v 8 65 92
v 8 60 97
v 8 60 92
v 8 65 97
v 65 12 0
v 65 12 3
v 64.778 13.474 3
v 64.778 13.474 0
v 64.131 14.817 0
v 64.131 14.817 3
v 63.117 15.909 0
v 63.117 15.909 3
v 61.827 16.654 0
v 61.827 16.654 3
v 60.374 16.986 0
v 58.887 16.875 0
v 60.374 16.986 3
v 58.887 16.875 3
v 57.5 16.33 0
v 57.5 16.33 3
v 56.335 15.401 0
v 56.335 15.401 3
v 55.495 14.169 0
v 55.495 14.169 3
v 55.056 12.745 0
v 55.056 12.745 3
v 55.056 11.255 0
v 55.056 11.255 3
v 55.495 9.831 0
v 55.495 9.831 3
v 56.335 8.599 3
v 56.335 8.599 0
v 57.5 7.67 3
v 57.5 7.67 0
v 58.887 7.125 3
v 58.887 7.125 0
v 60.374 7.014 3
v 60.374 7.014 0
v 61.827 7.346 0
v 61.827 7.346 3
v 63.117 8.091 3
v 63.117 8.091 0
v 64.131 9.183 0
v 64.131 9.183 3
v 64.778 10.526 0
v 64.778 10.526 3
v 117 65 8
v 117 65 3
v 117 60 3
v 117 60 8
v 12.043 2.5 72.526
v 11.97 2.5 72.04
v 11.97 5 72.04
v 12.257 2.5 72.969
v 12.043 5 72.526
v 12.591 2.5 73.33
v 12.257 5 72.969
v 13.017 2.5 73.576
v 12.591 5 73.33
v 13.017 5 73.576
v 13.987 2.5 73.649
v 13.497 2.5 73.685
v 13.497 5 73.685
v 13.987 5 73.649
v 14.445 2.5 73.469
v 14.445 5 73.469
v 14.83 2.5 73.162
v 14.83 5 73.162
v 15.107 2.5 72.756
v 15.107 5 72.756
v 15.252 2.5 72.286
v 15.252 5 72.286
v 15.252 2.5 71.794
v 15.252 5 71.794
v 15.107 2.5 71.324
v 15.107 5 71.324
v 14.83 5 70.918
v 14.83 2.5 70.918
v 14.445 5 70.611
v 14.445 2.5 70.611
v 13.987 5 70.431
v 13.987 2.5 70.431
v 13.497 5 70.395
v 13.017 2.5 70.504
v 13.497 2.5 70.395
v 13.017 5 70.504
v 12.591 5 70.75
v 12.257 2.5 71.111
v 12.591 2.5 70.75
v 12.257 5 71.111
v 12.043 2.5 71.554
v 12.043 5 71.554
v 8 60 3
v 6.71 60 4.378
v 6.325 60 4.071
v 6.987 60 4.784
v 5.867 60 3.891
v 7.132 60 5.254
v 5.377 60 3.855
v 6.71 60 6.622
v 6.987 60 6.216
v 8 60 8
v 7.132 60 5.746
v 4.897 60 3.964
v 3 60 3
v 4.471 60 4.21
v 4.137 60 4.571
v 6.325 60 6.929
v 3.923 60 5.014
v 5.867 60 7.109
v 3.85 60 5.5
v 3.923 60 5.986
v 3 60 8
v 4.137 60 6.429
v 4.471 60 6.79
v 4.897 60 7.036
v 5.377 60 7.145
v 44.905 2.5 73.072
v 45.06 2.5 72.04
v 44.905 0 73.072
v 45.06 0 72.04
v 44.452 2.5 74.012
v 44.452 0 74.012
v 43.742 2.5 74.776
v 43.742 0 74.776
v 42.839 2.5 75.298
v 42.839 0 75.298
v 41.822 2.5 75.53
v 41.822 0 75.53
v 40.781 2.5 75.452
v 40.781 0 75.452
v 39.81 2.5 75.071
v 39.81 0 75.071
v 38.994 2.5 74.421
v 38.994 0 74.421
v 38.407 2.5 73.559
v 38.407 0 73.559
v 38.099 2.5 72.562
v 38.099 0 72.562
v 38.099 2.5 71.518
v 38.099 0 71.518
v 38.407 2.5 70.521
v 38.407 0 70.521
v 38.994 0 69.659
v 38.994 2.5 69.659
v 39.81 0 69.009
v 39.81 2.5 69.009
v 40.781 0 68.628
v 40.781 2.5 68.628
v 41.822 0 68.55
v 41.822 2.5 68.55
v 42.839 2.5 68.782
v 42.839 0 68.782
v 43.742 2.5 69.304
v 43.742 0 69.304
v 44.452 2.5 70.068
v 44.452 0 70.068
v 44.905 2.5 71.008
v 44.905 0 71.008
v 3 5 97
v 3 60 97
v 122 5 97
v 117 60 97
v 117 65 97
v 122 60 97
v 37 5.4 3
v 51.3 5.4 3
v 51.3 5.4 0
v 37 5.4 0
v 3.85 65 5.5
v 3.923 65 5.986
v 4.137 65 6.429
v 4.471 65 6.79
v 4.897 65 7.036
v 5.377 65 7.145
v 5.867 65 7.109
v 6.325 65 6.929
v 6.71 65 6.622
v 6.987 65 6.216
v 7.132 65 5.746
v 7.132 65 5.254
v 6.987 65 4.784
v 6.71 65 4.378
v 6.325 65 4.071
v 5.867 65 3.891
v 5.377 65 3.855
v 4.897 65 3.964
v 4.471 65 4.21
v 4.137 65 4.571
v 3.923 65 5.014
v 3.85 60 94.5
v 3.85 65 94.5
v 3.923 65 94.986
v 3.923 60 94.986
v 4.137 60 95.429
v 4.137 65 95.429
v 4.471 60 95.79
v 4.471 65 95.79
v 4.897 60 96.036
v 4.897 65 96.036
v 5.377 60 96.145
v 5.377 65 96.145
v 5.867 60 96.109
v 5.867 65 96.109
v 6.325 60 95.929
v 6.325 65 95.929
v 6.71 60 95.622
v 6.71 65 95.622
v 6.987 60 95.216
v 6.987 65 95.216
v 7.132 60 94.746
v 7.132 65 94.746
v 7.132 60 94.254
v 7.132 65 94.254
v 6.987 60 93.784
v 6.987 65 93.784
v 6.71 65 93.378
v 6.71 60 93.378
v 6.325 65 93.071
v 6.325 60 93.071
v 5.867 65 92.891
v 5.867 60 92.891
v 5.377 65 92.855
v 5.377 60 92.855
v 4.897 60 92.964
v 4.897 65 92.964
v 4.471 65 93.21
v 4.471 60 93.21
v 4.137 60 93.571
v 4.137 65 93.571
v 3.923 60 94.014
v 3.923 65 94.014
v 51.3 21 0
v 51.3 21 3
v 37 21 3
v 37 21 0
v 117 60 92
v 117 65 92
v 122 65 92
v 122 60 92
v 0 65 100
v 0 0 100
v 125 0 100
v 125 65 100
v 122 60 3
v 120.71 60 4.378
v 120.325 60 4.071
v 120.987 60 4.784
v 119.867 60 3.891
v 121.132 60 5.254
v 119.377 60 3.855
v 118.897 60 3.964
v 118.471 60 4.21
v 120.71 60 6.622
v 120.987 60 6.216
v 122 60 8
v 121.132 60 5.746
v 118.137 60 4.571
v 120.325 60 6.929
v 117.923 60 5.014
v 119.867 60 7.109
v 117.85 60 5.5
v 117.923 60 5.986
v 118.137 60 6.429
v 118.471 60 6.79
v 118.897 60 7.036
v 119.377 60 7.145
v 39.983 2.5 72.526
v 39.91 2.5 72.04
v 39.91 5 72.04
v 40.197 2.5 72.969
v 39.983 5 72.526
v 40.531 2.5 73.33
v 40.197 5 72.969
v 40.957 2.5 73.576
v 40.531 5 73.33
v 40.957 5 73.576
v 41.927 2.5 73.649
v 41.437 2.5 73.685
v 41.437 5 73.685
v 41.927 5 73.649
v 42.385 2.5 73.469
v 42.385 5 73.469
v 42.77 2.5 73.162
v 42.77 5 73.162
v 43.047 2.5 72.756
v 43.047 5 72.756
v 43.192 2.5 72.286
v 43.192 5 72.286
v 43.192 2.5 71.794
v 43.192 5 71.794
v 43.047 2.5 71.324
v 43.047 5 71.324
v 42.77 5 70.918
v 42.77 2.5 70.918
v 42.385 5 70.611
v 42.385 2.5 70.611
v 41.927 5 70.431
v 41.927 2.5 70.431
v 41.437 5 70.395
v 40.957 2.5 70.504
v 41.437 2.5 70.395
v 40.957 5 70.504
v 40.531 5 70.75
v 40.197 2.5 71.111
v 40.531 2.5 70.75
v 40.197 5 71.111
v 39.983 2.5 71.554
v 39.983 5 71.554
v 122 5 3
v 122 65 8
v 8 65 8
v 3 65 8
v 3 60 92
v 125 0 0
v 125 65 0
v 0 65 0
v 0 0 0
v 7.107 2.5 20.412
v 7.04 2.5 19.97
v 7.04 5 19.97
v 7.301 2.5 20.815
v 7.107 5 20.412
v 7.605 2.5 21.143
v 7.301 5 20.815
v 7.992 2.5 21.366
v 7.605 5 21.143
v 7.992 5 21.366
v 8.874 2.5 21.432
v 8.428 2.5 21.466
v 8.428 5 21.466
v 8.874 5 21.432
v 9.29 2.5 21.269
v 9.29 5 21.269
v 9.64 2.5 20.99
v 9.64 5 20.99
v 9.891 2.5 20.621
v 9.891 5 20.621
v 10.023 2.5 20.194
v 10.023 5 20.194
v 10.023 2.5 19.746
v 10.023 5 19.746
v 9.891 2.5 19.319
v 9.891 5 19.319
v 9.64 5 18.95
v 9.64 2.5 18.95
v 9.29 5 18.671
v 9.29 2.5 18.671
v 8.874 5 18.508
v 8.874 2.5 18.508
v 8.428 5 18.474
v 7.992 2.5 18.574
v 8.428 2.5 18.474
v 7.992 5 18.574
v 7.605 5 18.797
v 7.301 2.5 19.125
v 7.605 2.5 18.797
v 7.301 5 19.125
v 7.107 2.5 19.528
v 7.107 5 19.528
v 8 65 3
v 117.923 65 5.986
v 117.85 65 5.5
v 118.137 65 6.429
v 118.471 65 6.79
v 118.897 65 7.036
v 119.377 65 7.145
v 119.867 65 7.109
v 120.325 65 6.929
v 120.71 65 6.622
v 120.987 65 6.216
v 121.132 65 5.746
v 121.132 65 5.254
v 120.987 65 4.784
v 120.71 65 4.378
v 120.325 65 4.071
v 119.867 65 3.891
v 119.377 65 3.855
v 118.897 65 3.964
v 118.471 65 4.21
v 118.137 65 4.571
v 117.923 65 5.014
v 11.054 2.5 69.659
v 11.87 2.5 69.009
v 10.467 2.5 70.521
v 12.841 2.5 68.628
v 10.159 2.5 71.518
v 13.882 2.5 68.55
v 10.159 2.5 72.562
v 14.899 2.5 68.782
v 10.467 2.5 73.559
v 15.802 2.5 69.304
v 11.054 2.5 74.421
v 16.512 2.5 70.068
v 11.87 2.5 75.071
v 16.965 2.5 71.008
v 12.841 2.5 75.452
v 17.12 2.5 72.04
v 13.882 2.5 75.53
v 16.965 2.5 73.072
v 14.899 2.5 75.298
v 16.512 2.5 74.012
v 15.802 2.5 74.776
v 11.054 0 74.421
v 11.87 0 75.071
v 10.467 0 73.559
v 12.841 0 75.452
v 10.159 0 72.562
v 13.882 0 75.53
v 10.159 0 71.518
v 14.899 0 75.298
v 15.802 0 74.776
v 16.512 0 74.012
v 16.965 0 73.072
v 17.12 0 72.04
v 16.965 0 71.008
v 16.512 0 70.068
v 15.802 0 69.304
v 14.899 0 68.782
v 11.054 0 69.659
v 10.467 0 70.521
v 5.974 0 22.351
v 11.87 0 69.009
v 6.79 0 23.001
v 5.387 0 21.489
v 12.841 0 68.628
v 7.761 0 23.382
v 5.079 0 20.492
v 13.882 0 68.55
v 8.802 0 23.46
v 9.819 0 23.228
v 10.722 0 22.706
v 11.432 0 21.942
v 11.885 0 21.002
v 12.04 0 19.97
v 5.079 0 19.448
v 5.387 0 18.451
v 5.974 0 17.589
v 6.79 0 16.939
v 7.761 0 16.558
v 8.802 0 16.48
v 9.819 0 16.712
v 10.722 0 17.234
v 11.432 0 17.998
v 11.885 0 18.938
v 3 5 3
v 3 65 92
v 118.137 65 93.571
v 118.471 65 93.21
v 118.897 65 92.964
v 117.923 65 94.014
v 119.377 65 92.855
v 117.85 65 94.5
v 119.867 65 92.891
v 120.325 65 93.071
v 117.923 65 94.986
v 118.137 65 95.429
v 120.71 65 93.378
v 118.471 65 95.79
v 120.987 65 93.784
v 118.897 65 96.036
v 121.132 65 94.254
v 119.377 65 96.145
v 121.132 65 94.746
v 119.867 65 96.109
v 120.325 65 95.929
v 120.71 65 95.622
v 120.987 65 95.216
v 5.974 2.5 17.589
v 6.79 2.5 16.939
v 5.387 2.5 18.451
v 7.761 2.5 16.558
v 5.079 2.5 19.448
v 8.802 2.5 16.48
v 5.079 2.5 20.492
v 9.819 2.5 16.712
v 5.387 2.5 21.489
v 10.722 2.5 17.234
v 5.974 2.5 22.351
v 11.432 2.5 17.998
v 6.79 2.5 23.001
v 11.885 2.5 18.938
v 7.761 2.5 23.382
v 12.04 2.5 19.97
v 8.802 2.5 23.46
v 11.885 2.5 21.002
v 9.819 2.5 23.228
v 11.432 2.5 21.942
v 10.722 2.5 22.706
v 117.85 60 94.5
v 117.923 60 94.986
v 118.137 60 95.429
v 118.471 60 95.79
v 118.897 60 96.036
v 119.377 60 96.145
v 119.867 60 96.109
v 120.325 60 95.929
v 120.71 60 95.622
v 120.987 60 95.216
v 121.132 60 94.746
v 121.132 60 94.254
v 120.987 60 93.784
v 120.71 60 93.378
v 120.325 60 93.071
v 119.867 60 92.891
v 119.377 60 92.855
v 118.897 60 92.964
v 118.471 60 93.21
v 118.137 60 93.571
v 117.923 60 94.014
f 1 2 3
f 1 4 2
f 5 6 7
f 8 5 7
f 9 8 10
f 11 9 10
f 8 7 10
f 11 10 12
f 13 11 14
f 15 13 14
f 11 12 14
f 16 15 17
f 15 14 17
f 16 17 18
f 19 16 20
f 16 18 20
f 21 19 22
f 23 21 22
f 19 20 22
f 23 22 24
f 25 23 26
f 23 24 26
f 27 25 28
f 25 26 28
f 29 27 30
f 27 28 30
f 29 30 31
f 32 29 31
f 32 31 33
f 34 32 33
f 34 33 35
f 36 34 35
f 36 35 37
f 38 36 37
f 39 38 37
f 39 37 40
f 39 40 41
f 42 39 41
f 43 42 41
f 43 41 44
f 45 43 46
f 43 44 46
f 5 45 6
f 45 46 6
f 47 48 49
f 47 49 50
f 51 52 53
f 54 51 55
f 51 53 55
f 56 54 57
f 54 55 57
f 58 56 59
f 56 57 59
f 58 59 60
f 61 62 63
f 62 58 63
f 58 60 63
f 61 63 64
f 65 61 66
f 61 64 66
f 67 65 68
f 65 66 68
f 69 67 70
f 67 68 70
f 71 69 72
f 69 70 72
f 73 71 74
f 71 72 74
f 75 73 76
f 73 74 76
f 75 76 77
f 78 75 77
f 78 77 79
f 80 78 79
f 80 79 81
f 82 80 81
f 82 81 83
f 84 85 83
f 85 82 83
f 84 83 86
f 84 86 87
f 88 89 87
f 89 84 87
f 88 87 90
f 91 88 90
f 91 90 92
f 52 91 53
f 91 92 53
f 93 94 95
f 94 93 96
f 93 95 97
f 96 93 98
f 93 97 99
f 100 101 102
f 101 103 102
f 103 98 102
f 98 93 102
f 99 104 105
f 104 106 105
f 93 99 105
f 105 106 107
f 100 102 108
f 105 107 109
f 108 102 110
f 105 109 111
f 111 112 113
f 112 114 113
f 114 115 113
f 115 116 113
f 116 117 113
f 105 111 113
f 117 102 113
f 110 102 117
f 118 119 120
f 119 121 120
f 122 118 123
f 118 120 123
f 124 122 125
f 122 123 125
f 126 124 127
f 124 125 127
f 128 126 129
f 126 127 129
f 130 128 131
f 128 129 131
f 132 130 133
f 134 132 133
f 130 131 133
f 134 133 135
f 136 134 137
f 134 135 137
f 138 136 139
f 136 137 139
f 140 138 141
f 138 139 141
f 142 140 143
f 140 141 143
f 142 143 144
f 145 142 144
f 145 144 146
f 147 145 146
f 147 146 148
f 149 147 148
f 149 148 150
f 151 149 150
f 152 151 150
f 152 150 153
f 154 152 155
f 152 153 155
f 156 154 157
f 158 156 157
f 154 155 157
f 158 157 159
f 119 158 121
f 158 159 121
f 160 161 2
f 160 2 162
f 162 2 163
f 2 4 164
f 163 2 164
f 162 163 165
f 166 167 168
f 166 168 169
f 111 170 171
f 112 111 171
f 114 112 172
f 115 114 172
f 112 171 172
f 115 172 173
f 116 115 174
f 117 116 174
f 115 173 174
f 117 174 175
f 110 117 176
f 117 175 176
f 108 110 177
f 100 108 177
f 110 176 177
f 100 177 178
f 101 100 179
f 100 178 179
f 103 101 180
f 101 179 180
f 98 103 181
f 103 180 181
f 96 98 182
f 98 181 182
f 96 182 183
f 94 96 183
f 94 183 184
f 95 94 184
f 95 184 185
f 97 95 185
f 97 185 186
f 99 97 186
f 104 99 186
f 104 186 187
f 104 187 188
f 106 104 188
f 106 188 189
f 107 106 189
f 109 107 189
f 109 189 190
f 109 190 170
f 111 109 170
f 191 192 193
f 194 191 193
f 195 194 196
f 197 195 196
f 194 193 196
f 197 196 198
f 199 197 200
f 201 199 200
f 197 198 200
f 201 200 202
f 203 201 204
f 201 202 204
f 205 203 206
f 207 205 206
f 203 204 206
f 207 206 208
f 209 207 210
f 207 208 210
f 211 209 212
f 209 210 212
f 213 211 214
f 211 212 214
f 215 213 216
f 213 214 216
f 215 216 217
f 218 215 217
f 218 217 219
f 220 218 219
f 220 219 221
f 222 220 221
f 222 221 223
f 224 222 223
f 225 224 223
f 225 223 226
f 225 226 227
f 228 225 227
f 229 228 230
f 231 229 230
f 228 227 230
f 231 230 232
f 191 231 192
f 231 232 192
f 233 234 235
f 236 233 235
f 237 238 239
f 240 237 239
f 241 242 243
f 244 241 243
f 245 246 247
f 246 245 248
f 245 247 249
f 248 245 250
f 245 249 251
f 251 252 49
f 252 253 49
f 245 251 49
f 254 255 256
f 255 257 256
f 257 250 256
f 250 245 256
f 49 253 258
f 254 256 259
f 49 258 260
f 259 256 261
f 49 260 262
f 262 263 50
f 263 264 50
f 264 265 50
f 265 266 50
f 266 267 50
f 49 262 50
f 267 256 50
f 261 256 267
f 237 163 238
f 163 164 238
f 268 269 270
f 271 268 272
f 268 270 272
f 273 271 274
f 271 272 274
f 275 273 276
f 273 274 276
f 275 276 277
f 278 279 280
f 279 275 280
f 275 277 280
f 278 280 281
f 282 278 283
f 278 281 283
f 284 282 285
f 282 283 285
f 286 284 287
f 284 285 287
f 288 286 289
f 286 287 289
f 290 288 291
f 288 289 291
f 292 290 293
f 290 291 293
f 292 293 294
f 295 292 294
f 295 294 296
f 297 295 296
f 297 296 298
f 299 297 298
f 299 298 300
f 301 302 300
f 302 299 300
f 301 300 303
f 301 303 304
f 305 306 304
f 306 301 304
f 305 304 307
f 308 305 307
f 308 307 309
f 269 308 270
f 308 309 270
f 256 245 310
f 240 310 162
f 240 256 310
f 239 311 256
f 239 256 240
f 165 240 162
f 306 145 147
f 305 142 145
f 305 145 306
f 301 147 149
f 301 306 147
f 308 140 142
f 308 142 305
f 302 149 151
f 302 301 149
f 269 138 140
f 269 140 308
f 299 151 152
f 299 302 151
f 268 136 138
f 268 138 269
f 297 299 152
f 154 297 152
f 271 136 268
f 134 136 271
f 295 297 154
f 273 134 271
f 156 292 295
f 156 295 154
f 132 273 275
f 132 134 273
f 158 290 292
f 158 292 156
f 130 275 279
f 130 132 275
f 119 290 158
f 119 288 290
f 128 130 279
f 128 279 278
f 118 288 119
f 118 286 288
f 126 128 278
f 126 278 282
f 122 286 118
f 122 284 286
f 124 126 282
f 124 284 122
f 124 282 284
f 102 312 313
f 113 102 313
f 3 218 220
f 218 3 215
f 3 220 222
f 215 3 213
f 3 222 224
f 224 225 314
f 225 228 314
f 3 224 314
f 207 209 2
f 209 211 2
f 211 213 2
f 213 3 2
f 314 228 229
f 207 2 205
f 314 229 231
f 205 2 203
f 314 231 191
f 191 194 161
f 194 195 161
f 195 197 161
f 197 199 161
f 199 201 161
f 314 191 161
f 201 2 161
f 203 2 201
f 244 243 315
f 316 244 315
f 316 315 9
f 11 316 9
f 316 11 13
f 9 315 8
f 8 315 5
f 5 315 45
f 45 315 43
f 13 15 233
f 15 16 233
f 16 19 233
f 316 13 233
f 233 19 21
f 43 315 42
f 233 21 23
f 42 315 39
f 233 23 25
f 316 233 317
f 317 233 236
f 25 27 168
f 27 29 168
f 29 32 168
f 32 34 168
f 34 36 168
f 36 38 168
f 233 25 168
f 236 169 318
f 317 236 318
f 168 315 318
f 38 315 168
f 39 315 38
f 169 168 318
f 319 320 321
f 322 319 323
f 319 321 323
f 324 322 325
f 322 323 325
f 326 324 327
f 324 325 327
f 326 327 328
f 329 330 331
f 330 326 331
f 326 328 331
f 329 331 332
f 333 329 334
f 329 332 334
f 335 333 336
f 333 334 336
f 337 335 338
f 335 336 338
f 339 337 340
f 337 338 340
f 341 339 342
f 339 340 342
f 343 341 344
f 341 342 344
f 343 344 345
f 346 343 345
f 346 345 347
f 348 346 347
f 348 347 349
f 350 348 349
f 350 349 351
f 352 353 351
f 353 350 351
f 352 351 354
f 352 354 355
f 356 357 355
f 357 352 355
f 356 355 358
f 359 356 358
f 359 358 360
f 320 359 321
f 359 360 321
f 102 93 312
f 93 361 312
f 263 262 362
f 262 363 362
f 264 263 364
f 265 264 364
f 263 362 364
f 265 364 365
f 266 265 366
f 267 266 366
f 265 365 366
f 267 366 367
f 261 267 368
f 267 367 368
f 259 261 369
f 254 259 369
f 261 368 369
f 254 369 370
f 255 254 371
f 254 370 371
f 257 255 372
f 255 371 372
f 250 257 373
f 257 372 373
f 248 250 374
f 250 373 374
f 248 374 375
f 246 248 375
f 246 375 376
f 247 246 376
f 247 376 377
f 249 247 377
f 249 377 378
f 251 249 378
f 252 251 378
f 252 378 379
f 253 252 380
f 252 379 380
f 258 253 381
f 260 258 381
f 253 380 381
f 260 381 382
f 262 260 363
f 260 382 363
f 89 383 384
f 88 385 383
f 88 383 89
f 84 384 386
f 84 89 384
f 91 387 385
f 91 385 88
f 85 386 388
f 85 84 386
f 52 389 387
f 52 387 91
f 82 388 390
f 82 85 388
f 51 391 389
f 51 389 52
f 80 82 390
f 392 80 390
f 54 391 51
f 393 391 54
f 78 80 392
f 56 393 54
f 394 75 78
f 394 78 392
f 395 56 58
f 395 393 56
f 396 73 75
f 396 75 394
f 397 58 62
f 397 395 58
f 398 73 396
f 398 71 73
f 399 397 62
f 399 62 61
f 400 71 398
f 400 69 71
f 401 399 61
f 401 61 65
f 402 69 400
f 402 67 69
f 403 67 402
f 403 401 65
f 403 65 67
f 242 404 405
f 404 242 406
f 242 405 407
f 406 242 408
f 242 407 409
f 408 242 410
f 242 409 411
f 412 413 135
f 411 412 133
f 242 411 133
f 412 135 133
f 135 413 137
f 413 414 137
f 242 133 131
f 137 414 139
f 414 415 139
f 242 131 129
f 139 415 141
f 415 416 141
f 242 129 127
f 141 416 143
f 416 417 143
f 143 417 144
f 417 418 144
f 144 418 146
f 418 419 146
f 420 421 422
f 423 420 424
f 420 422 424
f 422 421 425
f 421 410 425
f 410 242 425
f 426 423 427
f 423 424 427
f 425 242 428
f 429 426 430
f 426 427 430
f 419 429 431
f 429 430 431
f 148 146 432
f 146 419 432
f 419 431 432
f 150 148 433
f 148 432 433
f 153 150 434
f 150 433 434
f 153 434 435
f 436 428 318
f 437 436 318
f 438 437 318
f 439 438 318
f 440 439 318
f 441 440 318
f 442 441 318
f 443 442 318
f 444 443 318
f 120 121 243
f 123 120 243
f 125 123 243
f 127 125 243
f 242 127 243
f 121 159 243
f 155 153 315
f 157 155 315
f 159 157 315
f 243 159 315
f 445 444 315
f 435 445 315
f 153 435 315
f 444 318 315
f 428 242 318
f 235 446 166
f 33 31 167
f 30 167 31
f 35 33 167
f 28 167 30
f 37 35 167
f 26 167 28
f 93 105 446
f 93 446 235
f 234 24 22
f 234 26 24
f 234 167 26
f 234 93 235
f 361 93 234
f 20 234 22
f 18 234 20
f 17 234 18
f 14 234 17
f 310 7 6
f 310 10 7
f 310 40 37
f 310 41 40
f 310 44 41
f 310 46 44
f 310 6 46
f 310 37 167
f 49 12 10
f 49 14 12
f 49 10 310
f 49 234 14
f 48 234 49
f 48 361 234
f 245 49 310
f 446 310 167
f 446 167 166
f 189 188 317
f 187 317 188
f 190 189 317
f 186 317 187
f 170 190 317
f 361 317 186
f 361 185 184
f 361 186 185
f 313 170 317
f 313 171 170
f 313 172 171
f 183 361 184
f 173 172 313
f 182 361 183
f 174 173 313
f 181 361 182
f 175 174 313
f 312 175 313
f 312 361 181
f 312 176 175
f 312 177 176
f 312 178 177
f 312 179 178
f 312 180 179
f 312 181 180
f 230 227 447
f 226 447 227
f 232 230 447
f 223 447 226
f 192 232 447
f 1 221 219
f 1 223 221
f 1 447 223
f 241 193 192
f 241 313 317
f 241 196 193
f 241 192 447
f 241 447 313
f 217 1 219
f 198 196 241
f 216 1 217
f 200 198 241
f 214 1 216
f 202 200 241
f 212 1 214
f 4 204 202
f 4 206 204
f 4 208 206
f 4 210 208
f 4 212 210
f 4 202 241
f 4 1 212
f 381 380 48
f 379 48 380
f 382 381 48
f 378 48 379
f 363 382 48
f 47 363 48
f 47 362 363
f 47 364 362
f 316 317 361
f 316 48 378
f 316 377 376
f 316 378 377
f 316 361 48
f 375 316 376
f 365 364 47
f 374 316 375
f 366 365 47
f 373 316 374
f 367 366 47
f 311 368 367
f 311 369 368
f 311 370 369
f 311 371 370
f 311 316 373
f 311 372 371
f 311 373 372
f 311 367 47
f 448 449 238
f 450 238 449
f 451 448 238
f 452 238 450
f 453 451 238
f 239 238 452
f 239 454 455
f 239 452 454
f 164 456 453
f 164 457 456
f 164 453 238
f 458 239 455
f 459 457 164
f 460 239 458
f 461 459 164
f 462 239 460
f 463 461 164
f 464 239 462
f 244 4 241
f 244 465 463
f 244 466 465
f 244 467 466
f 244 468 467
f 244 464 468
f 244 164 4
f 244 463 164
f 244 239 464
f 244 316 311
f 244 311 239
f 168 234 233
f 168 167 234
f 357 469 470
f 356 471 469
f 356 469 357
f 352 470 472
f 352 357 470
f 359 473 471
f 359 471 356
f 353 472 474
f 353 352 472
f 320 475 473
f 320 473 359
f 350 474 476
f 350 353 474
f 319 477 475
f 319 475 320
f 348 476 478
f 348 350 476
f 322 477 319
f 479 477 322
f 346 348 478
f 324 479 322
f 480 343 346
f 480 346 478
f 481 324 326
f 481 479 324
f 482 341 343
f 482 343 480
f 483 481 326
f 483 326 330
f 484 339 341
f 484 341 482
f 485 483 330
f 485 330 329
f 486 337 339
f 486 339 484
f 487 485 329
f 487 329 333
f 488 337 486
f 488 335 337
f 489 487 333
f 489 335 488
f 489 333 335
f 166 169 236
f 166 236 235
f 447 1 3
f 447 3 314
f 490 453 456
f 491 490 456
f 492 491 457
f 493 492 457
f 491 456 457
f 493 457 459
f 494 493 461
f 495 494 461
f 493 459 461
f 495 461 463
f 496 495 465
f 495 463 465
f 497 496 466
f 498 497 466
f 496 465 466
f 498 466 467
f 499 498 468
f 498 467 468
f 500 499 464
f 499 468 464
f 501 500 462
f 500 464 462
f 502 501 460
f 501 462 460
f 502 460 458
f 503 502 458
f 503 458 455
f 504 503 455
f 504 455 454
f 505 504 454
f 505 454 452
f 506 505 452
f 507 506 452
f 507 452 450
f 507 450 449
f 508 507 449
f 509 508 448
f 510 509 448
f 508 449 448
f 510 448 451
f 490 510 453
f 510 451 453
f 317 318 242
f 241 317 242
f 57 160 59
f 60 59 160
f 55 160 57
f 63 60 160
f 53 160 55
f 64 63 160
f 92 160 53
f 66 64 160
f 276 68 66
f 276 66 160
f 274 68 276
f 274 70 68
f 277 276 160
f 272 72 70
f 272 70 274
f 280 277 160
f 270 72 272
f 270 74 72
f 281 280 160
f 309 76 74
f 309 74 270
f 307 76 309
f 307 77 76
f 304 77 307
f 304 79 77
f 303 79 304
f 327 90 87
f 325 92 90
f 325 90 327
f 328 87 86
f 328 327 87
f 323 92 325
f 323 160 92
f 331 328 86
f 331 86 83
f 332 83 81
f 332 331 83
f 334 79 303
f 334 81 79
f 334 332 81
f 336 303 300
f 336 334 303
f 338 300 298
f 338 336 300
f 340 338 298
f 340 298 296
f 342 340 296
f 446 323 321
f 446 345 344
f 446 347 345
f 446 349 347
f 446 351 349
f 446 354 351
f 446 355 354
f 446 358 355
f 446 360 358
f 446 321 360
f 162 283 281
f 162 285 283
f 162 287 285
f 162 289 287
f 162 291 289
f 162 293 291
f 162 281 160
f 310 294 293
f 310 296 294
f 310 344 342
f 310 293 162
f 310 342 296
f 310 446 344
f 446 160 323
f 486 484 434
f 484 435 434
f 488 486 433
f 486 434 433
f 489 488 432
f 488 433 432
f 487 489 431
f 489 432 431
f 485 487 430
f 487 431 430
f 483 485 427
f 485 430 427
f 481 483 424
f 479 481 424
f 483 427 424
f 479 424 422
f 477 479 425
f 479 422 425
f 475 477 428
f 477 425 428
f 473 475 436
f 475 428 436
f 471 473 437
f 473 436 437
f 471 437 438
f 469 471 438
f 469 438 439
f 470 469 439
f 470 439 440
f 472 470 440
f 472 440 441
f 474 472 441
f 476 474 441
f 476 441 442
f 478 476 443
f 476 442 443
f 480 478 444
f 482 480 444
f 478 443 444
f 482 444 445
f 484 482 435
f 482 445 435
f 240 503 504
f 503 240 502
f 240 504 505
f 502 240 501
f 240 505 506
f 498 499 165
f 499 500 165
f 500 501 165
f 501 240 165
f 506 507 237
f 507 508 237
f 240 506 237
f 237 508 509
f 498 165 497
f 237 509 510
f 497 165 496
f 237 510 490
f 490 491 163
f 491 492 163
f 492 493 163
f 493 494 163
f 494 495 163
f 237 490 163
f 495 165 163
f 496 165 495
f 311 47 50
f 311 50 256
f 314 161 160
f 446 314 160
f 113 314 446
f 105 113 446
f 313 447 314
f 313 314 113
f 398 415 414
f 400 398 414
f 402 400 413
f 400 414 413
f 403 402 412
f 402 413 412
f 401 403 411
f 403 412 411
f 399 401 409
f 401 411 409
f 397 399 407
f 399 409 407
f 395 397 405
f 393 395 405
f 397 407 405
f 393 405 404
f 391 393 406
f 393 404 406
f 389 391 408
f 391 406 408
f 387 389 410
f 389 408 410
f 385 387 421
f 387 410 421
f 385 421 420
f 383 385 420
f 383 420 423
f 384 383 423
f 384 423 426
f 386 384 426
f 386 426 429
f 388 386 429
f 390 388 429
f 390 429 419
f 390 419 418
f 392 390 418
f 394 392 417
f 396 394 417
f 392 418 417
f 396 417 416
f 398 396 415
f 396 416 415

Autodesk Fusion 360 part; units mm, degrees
sketch "Sketch1" plane through (0, 0, 0) normal (0, 1, 0) x (1, 0, 0)
  line L0 (0, 0) -> (125, 0)
  line L1 (125, 0) -> (125, -100)
  line L2 (125, -100) -> (0, -100)
  line L3 (0, -100) -> (0, 0)
  dimension "d1" = 125
  dimension "d2" = 100
extrude "Extrude1" add sketch "Sketch1" along normal blind 5
sketch "Sketch2" plane through (0, 5, 0) normal (0, 1, 0) x (-1, 0, 0)
  line L0 (0, 100) -> (-125, 100)
  line L1 (-125, 100) -> (-125, 0)
  line L2 (-125, 0) -> (0, 0)
  line L3 (0, 0) -> (0, 100)
  line L4 (-122, 3) -> (-3, 3)
  line L5 (-3, 3) -> (-3, 97)
  line L6 (-3, 97) -> (-122, 97)
  line L7 (-122, 97) -> (-122, 3)
  line L8 (-6, 6) -> (-59.3, 6)
  line L9 (-59.3, 6) -> (-59.3, 74.6)
  line L10 (-59.3, 74.6) -> (-6, 74.6)
  line L11 (-6, 74.6) -> (-6, 6)
  line L12 (-59.3, 6) -> (-52.3, 6)
  line L13 (-6, 6) -> (-37, 6)
  line L14 (-37, 3) -> (-52, 3)
  line L15 (-52, 3) -> (-52, 0)
  line L16 (-52, 0) -> (-37, 0)
  line L17 (-37, 0) -> (-37, 3)
  line L18 (-6, 6) -> (-6, 19.97)
  circle A0 centre (-8.54, 19.97) radius 1.5
  line L19 (-6, 6) -> (-6, 72.04)
  circle A1 centre (-13.62, 72.04) radius 1.65
  circle A2 centre (-41.56, 72.04) radius 1.65
  line L20 (-119, 6) -> (-64, 6)
  line L21 (-64, 6) -> (-64, 90)
  line L22 (-64, 90) -> (-119, 90)
  line L23 (-119, 90) -> (-119, 6)
  dimension "d9" = 53.3
  dimension "d10" = 68.6
  dimension "d11" = 7
  dimension "d12" = 31
  dimension "d13" = 13.97
  dimension "d14" = 2.54
  dimension "d15" = 3
  dimension "d16" = 66.04
  dimension "d17" = 7.62
  dimension "d18" = 35.56
  dimension "d19" = 3.3
  dimension "d20" = 3.3
  dimension "d21" = 55
  dimension "d22" = 84
extrude "Extrude2" cut sketch "Sketch2" against normal blind 5 contours A0 | A1 | A2
sketch "Sketch3" plane through (0, 5, 0) normal (0, 1, 0) x (-1, 0, 0)
  circle A0 centre (-8.54, 19.97) radius 1.5
  circle A1 centre (-13.62, 72.04) radius 1.65
  circle A2 centre (-41.56, 72.04) radius 1.65
  line L0 (0, 100) -> (-125, 100)
  line L1 (-125, 100) -> (-125, 0)
  line L2 (-125, 0) -> (0, 0)
  line L3 (0, 0) -> (0, 100)
  line L4 (-3, 3) -> (-123.5, 3)
  line L5 (-123.5, 3) -> (-123.5, 98.5)
  line L6 (-123.5, 98.5) -> (-3, 98.5)
  line L7 (-3, 98.5) -> (-3, 3)
  line L8 (-6, 6) -> (-59.3, 6)
  line L9 (-59.3, 6) -> (-59.3, 74.6)
  line L10 (-59.3, 74.6) -> (-6, 74.6)
  line L11 (-6, 74.6) -> (-6, 6)
  line L12 (-6, 6) -> (-37, 6)
  line L13 (-59.3, 6) -> (-51.3, 6)
  line L14 (-37, 3) -> (-51.3, 3)
  line L15 (-51.3, 3) -> (-51.3, 0)
  line L16 (-51.3, 0) -> (-37, 0)
  line L17 (-37, 0) -> (-37, 3)
  dimension "d25" = 53.3
  dimension "d26" = 68.6
  dimension "d27" = 31
  dimension "d28" = 8
extrude "Extrude3" add sketch "Sketch3" along normal blind 1 contours L0 L1 L2 L3 L4 L5 L6 L7 L15 L17
sketch "Sketch4" plane through (0, 0, 0) normal (0, -1, 0) x (1, 0, 0)
  circle A0 centre (8.54, 19.97) radius 1.5
  circle A1 centre (13.62, 72.04) radius 1.65
  circle A2 centre (41.56, 72.04) radius 1.65
  line L0 (125, 100) -> (0, 100)
  line L1 (0, 100) -> (0, 0)
  line L2 (0, 0) -> (125, 0)
  line L3 (125, 0) -> (125, 100)
  circle A3 centre (8.54, 19.97) radius 3.5
  circle A4 centre (13.62, 72.04) radius 3.5
  circle A5 centre (41.56, 72.04) radius 3.5
  dimension "d31" = 7
  dimension "d32" = 7
  dimension "d33" = 7
extrude "Extrude4" cut sketch "Sketch4" against normal blind 2.5 contours A3 | A4 | A5
extrude "Extrude5" add 1 faces at (1, 6, 34.3333) along direction (0, 1, 0) blind 17
sketch "Sketch5" plane through (0, 5, 0) normal (0, 1, 0) x (-1, 0, 0)
  line L0 (-51.3, 3) -> (-51.3, 0)
  line L1 (-51.3, 0) -> (-37, 0)
  line L2 (-37, 0) -> (-37, 3)
  line L3 (-37, 3) -> (-3, 3)
  line L4 (-3, 3) -> (-3, 98.5)
  line L5 (-3, 98.5) -> (-123.5, 98.5)
  line L6 (-123.5, 98.5) -> (-123.5, 3)
  line L7 (-123.5, 3) -> (-51.3, 3)
  circle A0 centre (-8.54, 19.97) radius 1.5
  circle A1 centre (-13.62, 72.04) radius 1.65
  circle A2 centre (-41.56, 72.04) radius 1.65
  line L8 (-51.3, 3) -> (-37, 3)
  line L9 (-37, 3) -> (-37, 0)
  line L10 (-37, 0) -> (-51.3, 0)
  line L11 (-51.3, 0) -> (-51.3, 3)
extrude "Extrude6" add sketch "Sketch5" along normal blind 0.4 contours L0 L1 L2 L8 L9 L10 L11
extrude "Extrude7" cut 1 faces at (1, 23, 34.3333) along direction (0, -1, 0) blind 2
sketch "Sketch6" plane through (0, 21, 0) normal (0, 1, 0) x (-1, 0, 0)
  line L0 (0, 0) -> (0, 100)
  line L1 (0, 100) -> (-125, 100)
  line L2 (-125, 100) -> (-125, 0)
  line L3 (-125, 0) -> (-51.3, 0)
  line L4 (-51.3, 0) -> (-51.3, 3)
  line L5 (-51.3, 3) -> (-123.5, 3)
  line L6 (-123.5, 3) -> (-123.5, 98.5)
  line L7 (-123.5, 98.5) -> (-3, 98.5)
  line L8 (-3, 98.5) -> (-3, 3)
  line L9 (-3, 3) -> (-37, 3)
  line L10 (-37, 3) -> (-37, 0)
  line L11 (-37, 0) -> (0, 0)
  line L12 (-37, 0) -> (-51.3, 0)
  line L13 (-51.3, 0) -> (-51.3, 3)
  line L14 (-51.3, 3) -> (-37, 3)
  line L15 (-37, 3) -> (-37, 0)
extrude "Extrude8" add sketch "Sketch6" along normal blind 44 contours L0 L1 L2 L3 L4 L5 L6 L7 L8 L9 L10 L11 L13 L15 | L4 L10 L12 L13 L14 L15
sketch "Sketch7" plane through (0, 0, 3) normal (0, 0, 1) x (1, 0, 0)
  line L0 (3, 65) -> (3, 5)
  line L1 (3, 5) -> (123.5, 5)
  line L2 (123.5, 5) -> (123.5, 65)
  line L3 (123.5, 65) -> (3, 65)
  line L4 (37, 21) -> (51.3, 21)
  line L5 (51.3, 21) -> (51.3, 5.4)
  line L6 (51.3, 5.4) -> (37, 5.4)
  line L7 (37, 5.4) -> (37, 21)
  circle A0 centre (60, 12) radius 5
  dimension "d44" = 10
extrude "Extrude9" cut sketch "Sketch7" against normal blind 3 contours A0
extrude "Extrude10" add 1 faces at (83.3333, 25, 98.5) along direction (0, 0, -1) blind 1.5
extrude "Extrude11" add 1 faces at (123.5, 25, 34.3333) along direction (-1, 0, 0) blind 1.5
sketch "Sketch8" plane through (0, 5, 0) normal (0, 1, 0) x (-1, 0, 0)
  line L0 (-122, 97) -> (-122, 3)
  line L1 (-122, 3) -> (-3, 3)
  line L2 (-3, 3) -> (-3, 97)
  line L3 (-3, 97) -> (-122, 97)
  circle A0 centre (-41.56, 72.04) radius 1.65
  circle A1 centre (-13.62, 72.04) radius 1.65
  circle A2 centre (-8.54, 19.97) radius 1.5
sketch "Sketch9" plane through (0, 65, 0) normal (0, 1, 0) x (-1, 0, 0)
  line L0 (-3, 3) -> (-122, 3)
  line L1 (-122, 3) -> (-122, 97)
  line L2 (-122, 97) -> (-3, 97)
  line L3 (-3, 97) -> (-3, 3)
  line L4 (0, 0) -> (0, 100)
  line L5 (0, 100) -> (-125, 100)
  line L6 (-125, 100) -> (-125, 0)
  line L7 (-125, 0) -> (0, 0)
  line L8 (-122, 97) -> (-112, 97)
  line L9 (-112, 97) -> (-112, 87)
  line L10 (-112, 87) -> (-122, 87)
  line L11 (-122, 87) -> (-122, 97)
  line L12 (-122, 3) -> (-112, 3)
  line L13 (-112, 3) -> (-112, 13)
  line L14 (-112, 13) -> (-122, 13)
  line L15 (-122, 13) -> (-122, 3)
  line L16 (-3, 97) -> (-13, 97)
  line L17 (-13, 97) -> (-13, 87)
  line L18 (-13, 87) -> (-3, 87)
  line L19 (-3, 87) -> (-3, 97)
  line L20 (-3, 3) -> (-13, 3)
  line L21 (-13, 3) -> (-13, 13)
  line L22 (-13, 13) -> (-3, 13)
  line L23 (-3, 13) -> (-3, 3)
  dimension "d51" = 10
  dimension "d52" = 10
  dimension "d53" = 10
  dimension "d54" = 10
  dimension "d55" = 10
  dimension "d56" = 10
extrude "Extrude12" add sketch "Sketch9" against normal blind 3 contours L0 L3 L20 L21 L22 L23 | L0 L1 L12 L13 L14 L15 | L2 L3 L16 L17 L18 L19 | L1 L2 L8 L9 L10 L11
sketch "Sketch10" plane through (0, 65, 0) normal (0, 1, 0) x (-1, 0, 0)
  line L0 (-13, 3) -> (-112, 3)
  line L1 (-112, 3) -> (-112, 13)
  line L2 (-112, 13) -> (-122, 13)
  line L3 (-122, 13) -> (-122, 87)
  line L4 (-122, 87) -> (-112, 87)
  line L5 (-112, 87) -> (-112, 97)
  line L6 (-112, 97) -> (-13, 97)
  line L7 (-13, 97) -> (-13, 87)
  line L8 (-13, 87) -> (-3, 87)
  line L9 (-3, 87) -> (-3, 13)
  line L10 (-3, 13) -> (-13, 13)
  line L11 (-13, 13) -> (-13, 3)
  line L12 (0, 0) -> (0, 100)
  line L13 (0, 100) -> (-125, 100)
  line L14 (-125, 100) -> (-125, 0)
  line L15 (-125, 0) -> (0, 0)
  circle A0 centre (-8, 8) radius 1.65
  circle A1 centre (-8, 92) radius 1.65
  circle A2 centre (-117, 92) radius 1.65
  circle A3 centre (-117, 8) radius 1.65
  dimension "d59" = 3.3
  dimension "d60" = 3.3
  dimension "d61" = 3.3
  dimension "d62" = 3.3
extrude "Extrude13" cut sketch "Sketch10" against normal blind 3 contours A0 | A1 | A2 | A3
delete_face "DeleteFace1" 1 faces at (115.3521, 63, 91.9178)
delete_face "DeleteFace2" 1 faces at (117.7527, 63, 6.5317)
delete_face "DeleteFace3" 2 faces at (6.3582, 64, 7.8357) (6.3521, 63, 91.9178)
sketch "Sketch11" plane through (0, 65, 0) normal (0, 1, 0) x (-1, 0, 0)
  line L0 (-13, 3) -> (-112, 3)
  line L1 (-112, 3) -> (-112, 13)
  line L2 (-112, 13) -> (-122, 13)
  line L3 (-122, 13) -> (-122, 87)
  line L4 (-122, 87) -> (-112, 87)
  line L5 (-112, 87) -> (-112, 97)
  line L6 (-112, 97) -> (-13, 97)
  line L7 (-13, 97) -> (-13, 87)
  line L8 (-13, 87) -> (-3, 87)
  line L9 (-3, 87) -> (-3, 13)
  line L10 (-3, 13) -> (-13, 13)
  line L11 (-13, 13) -> (-13, 3)
  line L12 (0, 0) -> (0, 100)
  line L13 (0, 100) -> (-125, 100)
  line L14 (-125, 100) -> (-125, 0)
  line L15 (-125, 0) -> (0, 0)
  line L16 (-13, 13) -> (-3, 13)
  line L17 (-3, 13) -> (-3, 3)
  line L18 (-3, 3) -> (-13, 3)
  line L19 (-13, 3) -> (-13, 13)
  line L20 (-13, 87) -> (-3, 87)
  line L21 (-3, 87) -> (-3, 97)
  line L22 (-3, 97) -> (-13, 97)
  line L23 (-13, 97) -> (-13, 87)
  line L24 (-112, 87) -> (-122, 87)
  line L25 (-122, 87) -> (-122, 97)
  line L26 (-122, 97) -> (-112, 97)
  line L27 (-112, 97) -> (-112, 87)
  line L28 (-112, 13) -> (-122, 13)
  line L29 (-122, 13) -> (-122, 3)
  line L30 (-122, 3) -> (-112, 3)
  line L31 (-112, 3) -> (-112, 13)
extrude "Extrude14" cut sketch "Sketch11" against normal blind 3 contours L10 L11 L16 L17 L18 L19 | L1 L2 L28 L29 L30 L31 | L7 L8 L20 L21 L22 L23 | L4 L5 L24 L25 L26 L27
sketch "Sketch12" plane through (0, 65, 0) normal (0, 1, 0) x (-1, 0, 0)
  line L0 (-3, 97) -> (-3, 3)
  line L1 (-3, 3) -> (-122, 3)
  line L2 (-122, 3) -> (-122, 97)
  line L3 (-122, 97) -> (-3, 97)
  line L4 (0, 0) -> (0, 100)
  line L5 (0, 100) -> (-125, 100)
  line L6 (-125, 100) -> (-125, 0)
  line L7 (-125, 0) -> (0, 0)
  line L8 (-3, 3) -> (-8, 3)
  line L9 (-8, 3) -> (-8, 8)
  line L10 (-8, 8) -> (-3, 8)
  line L11 (-3, 8) -> (-3, 3)
  line L12 (-3, 97) -> (-8, 97)
  line L13 (-8, 97) -> (-8, 92)
  line L14 (-8, 92) -> (-3, 92)
  line L15 (-3, 92) -> (-3, 97)
  line L16 (-122, 97) -> (-117, 97)
  line L17 (-117, 97) -> (-117, 92)
  line L18 (-117, 92) -> (-122, 92)
  line L19 (-122, 92) -> (-122, 97)
  line L20 (-122, 3) -> (-117, 3)
  line L21 (-117, 3) -> (-117, 8)
  line L22 (-117, 8) -> (-122, 8)
  line L23 (-122, 8) -> (-122, 3)
extrude "Extrude15" add sketch "Sketch12" against normal blind 5 contours L0 L3 L12 L13 L14 L15 | L0 L1 L8 L9 L10 L11 | L2 L3 L16 L17 L18 L19 | L1 L2 L20 L21 L22 L23
sketch "Sketch13" plane through (0, 65, 0) normal (0, 1, 0) x (-1, 0, 0)
  line L0 (-3, 92) -> (-3, 8)
  line L1 (-3, 8) -> (-8, 8)
  line L2 (-8, 8) -> (-8, 3)
  line L3 (-8, 3) -> (-117, 3)
  line L4 (-117, 3) -> (-117, 8)
  line L5 (-117, 8) -> (-122, 8)
  line L6 (-122, 8) -> (-122, 92)
  line L7 (-122, 92) -> (-117, 92)
  line L8 (-117, 92) -> (-117, 97)
  line L9 (-117, 97) -> (-8, 97)
  line L10 (-8, 97) -> (-8, 92)
  line L11 (-8, 92) -> (-3, 92)
  line L12 (0, 0) -> (0, 100)
  line L13 (0, 100) -> (-125, 100)
  line L14 (-125, 100) -> (-125, 0)
  line L15 (-125, 0) -> (0, 0)
  circle A0 centre (-5.5, 5.5) radius 1.65
  line L16 (-8, 92) -> (-5.5, 92)
  line L17 (-8, 94.5) -> (-8, 92)
  circle A1 centre (-5.5, 94.5) radius 1.65
  line L18 (-117, 92) -> (-119.5, 92)
  line L19 (-117, 94.5) -> (-117, 92)
  circle A2 centre (-119.5, 94.5) radius 1.65
  line L20 (-117, 8) -> (-119.5, 8)
  line L21 (-117, 5.5) -> (-117, 8)
  circle A3 centre (-119.5, 5.5) radius 1.65
  dimension "d69" = 3.3
  dimension "d70" = 3.3
  dimension "d71" = 3.3
  dimension "d72" = 3.3
extrude "Extrude16" cut sketch "Sketch13" against normal blind 5 contours A0 | A1 | A2 | A3
sketch "Sketch14" plane through (0, 65, 0) normal (0, 1, 0) x (-1, 0, 0)
  circle A0 centre (-119.5, 5.5) radius 1.65
  circle A1 centre (-5.5, 5.5) radius 1.65
  circle A2 centre (-119.5, 94.5) radius 1.65
  circle A3 centre (-5.5, 94.5) radius 1.65
  line L0 (-3, 92) -> (-3, 8)
  line L1 (-3, 8) -> (-8, 8)
  line L2 (-8, 8) -> (-8, 3)
  line L3 (-8, 3) -> (-117, 3)
  line L4 (-117, 3) -> (-117, 8)
  line L5 (-117, 8) -> (-122, 8)
  line L6 (-122, 8) -> (-122, 92)
  line L7 (-122, 92) -> (-117, 92)
  line L8 (-117, 92) -> (-117, 97)
  line L9 (-117, 97) -> (-8, 97)
  line L10 (-8, 97) -> (-8, 92)
  line L11 (-8, 92) -> (-3, 92)
  line L12 (0, 0) -> (0, 100)
  line L13 (0, 100) -> (-125, 100)
  line L14 (-125, 100) -> (-125, 0)
  line L15 (-125, 0) -> (0, 0)
